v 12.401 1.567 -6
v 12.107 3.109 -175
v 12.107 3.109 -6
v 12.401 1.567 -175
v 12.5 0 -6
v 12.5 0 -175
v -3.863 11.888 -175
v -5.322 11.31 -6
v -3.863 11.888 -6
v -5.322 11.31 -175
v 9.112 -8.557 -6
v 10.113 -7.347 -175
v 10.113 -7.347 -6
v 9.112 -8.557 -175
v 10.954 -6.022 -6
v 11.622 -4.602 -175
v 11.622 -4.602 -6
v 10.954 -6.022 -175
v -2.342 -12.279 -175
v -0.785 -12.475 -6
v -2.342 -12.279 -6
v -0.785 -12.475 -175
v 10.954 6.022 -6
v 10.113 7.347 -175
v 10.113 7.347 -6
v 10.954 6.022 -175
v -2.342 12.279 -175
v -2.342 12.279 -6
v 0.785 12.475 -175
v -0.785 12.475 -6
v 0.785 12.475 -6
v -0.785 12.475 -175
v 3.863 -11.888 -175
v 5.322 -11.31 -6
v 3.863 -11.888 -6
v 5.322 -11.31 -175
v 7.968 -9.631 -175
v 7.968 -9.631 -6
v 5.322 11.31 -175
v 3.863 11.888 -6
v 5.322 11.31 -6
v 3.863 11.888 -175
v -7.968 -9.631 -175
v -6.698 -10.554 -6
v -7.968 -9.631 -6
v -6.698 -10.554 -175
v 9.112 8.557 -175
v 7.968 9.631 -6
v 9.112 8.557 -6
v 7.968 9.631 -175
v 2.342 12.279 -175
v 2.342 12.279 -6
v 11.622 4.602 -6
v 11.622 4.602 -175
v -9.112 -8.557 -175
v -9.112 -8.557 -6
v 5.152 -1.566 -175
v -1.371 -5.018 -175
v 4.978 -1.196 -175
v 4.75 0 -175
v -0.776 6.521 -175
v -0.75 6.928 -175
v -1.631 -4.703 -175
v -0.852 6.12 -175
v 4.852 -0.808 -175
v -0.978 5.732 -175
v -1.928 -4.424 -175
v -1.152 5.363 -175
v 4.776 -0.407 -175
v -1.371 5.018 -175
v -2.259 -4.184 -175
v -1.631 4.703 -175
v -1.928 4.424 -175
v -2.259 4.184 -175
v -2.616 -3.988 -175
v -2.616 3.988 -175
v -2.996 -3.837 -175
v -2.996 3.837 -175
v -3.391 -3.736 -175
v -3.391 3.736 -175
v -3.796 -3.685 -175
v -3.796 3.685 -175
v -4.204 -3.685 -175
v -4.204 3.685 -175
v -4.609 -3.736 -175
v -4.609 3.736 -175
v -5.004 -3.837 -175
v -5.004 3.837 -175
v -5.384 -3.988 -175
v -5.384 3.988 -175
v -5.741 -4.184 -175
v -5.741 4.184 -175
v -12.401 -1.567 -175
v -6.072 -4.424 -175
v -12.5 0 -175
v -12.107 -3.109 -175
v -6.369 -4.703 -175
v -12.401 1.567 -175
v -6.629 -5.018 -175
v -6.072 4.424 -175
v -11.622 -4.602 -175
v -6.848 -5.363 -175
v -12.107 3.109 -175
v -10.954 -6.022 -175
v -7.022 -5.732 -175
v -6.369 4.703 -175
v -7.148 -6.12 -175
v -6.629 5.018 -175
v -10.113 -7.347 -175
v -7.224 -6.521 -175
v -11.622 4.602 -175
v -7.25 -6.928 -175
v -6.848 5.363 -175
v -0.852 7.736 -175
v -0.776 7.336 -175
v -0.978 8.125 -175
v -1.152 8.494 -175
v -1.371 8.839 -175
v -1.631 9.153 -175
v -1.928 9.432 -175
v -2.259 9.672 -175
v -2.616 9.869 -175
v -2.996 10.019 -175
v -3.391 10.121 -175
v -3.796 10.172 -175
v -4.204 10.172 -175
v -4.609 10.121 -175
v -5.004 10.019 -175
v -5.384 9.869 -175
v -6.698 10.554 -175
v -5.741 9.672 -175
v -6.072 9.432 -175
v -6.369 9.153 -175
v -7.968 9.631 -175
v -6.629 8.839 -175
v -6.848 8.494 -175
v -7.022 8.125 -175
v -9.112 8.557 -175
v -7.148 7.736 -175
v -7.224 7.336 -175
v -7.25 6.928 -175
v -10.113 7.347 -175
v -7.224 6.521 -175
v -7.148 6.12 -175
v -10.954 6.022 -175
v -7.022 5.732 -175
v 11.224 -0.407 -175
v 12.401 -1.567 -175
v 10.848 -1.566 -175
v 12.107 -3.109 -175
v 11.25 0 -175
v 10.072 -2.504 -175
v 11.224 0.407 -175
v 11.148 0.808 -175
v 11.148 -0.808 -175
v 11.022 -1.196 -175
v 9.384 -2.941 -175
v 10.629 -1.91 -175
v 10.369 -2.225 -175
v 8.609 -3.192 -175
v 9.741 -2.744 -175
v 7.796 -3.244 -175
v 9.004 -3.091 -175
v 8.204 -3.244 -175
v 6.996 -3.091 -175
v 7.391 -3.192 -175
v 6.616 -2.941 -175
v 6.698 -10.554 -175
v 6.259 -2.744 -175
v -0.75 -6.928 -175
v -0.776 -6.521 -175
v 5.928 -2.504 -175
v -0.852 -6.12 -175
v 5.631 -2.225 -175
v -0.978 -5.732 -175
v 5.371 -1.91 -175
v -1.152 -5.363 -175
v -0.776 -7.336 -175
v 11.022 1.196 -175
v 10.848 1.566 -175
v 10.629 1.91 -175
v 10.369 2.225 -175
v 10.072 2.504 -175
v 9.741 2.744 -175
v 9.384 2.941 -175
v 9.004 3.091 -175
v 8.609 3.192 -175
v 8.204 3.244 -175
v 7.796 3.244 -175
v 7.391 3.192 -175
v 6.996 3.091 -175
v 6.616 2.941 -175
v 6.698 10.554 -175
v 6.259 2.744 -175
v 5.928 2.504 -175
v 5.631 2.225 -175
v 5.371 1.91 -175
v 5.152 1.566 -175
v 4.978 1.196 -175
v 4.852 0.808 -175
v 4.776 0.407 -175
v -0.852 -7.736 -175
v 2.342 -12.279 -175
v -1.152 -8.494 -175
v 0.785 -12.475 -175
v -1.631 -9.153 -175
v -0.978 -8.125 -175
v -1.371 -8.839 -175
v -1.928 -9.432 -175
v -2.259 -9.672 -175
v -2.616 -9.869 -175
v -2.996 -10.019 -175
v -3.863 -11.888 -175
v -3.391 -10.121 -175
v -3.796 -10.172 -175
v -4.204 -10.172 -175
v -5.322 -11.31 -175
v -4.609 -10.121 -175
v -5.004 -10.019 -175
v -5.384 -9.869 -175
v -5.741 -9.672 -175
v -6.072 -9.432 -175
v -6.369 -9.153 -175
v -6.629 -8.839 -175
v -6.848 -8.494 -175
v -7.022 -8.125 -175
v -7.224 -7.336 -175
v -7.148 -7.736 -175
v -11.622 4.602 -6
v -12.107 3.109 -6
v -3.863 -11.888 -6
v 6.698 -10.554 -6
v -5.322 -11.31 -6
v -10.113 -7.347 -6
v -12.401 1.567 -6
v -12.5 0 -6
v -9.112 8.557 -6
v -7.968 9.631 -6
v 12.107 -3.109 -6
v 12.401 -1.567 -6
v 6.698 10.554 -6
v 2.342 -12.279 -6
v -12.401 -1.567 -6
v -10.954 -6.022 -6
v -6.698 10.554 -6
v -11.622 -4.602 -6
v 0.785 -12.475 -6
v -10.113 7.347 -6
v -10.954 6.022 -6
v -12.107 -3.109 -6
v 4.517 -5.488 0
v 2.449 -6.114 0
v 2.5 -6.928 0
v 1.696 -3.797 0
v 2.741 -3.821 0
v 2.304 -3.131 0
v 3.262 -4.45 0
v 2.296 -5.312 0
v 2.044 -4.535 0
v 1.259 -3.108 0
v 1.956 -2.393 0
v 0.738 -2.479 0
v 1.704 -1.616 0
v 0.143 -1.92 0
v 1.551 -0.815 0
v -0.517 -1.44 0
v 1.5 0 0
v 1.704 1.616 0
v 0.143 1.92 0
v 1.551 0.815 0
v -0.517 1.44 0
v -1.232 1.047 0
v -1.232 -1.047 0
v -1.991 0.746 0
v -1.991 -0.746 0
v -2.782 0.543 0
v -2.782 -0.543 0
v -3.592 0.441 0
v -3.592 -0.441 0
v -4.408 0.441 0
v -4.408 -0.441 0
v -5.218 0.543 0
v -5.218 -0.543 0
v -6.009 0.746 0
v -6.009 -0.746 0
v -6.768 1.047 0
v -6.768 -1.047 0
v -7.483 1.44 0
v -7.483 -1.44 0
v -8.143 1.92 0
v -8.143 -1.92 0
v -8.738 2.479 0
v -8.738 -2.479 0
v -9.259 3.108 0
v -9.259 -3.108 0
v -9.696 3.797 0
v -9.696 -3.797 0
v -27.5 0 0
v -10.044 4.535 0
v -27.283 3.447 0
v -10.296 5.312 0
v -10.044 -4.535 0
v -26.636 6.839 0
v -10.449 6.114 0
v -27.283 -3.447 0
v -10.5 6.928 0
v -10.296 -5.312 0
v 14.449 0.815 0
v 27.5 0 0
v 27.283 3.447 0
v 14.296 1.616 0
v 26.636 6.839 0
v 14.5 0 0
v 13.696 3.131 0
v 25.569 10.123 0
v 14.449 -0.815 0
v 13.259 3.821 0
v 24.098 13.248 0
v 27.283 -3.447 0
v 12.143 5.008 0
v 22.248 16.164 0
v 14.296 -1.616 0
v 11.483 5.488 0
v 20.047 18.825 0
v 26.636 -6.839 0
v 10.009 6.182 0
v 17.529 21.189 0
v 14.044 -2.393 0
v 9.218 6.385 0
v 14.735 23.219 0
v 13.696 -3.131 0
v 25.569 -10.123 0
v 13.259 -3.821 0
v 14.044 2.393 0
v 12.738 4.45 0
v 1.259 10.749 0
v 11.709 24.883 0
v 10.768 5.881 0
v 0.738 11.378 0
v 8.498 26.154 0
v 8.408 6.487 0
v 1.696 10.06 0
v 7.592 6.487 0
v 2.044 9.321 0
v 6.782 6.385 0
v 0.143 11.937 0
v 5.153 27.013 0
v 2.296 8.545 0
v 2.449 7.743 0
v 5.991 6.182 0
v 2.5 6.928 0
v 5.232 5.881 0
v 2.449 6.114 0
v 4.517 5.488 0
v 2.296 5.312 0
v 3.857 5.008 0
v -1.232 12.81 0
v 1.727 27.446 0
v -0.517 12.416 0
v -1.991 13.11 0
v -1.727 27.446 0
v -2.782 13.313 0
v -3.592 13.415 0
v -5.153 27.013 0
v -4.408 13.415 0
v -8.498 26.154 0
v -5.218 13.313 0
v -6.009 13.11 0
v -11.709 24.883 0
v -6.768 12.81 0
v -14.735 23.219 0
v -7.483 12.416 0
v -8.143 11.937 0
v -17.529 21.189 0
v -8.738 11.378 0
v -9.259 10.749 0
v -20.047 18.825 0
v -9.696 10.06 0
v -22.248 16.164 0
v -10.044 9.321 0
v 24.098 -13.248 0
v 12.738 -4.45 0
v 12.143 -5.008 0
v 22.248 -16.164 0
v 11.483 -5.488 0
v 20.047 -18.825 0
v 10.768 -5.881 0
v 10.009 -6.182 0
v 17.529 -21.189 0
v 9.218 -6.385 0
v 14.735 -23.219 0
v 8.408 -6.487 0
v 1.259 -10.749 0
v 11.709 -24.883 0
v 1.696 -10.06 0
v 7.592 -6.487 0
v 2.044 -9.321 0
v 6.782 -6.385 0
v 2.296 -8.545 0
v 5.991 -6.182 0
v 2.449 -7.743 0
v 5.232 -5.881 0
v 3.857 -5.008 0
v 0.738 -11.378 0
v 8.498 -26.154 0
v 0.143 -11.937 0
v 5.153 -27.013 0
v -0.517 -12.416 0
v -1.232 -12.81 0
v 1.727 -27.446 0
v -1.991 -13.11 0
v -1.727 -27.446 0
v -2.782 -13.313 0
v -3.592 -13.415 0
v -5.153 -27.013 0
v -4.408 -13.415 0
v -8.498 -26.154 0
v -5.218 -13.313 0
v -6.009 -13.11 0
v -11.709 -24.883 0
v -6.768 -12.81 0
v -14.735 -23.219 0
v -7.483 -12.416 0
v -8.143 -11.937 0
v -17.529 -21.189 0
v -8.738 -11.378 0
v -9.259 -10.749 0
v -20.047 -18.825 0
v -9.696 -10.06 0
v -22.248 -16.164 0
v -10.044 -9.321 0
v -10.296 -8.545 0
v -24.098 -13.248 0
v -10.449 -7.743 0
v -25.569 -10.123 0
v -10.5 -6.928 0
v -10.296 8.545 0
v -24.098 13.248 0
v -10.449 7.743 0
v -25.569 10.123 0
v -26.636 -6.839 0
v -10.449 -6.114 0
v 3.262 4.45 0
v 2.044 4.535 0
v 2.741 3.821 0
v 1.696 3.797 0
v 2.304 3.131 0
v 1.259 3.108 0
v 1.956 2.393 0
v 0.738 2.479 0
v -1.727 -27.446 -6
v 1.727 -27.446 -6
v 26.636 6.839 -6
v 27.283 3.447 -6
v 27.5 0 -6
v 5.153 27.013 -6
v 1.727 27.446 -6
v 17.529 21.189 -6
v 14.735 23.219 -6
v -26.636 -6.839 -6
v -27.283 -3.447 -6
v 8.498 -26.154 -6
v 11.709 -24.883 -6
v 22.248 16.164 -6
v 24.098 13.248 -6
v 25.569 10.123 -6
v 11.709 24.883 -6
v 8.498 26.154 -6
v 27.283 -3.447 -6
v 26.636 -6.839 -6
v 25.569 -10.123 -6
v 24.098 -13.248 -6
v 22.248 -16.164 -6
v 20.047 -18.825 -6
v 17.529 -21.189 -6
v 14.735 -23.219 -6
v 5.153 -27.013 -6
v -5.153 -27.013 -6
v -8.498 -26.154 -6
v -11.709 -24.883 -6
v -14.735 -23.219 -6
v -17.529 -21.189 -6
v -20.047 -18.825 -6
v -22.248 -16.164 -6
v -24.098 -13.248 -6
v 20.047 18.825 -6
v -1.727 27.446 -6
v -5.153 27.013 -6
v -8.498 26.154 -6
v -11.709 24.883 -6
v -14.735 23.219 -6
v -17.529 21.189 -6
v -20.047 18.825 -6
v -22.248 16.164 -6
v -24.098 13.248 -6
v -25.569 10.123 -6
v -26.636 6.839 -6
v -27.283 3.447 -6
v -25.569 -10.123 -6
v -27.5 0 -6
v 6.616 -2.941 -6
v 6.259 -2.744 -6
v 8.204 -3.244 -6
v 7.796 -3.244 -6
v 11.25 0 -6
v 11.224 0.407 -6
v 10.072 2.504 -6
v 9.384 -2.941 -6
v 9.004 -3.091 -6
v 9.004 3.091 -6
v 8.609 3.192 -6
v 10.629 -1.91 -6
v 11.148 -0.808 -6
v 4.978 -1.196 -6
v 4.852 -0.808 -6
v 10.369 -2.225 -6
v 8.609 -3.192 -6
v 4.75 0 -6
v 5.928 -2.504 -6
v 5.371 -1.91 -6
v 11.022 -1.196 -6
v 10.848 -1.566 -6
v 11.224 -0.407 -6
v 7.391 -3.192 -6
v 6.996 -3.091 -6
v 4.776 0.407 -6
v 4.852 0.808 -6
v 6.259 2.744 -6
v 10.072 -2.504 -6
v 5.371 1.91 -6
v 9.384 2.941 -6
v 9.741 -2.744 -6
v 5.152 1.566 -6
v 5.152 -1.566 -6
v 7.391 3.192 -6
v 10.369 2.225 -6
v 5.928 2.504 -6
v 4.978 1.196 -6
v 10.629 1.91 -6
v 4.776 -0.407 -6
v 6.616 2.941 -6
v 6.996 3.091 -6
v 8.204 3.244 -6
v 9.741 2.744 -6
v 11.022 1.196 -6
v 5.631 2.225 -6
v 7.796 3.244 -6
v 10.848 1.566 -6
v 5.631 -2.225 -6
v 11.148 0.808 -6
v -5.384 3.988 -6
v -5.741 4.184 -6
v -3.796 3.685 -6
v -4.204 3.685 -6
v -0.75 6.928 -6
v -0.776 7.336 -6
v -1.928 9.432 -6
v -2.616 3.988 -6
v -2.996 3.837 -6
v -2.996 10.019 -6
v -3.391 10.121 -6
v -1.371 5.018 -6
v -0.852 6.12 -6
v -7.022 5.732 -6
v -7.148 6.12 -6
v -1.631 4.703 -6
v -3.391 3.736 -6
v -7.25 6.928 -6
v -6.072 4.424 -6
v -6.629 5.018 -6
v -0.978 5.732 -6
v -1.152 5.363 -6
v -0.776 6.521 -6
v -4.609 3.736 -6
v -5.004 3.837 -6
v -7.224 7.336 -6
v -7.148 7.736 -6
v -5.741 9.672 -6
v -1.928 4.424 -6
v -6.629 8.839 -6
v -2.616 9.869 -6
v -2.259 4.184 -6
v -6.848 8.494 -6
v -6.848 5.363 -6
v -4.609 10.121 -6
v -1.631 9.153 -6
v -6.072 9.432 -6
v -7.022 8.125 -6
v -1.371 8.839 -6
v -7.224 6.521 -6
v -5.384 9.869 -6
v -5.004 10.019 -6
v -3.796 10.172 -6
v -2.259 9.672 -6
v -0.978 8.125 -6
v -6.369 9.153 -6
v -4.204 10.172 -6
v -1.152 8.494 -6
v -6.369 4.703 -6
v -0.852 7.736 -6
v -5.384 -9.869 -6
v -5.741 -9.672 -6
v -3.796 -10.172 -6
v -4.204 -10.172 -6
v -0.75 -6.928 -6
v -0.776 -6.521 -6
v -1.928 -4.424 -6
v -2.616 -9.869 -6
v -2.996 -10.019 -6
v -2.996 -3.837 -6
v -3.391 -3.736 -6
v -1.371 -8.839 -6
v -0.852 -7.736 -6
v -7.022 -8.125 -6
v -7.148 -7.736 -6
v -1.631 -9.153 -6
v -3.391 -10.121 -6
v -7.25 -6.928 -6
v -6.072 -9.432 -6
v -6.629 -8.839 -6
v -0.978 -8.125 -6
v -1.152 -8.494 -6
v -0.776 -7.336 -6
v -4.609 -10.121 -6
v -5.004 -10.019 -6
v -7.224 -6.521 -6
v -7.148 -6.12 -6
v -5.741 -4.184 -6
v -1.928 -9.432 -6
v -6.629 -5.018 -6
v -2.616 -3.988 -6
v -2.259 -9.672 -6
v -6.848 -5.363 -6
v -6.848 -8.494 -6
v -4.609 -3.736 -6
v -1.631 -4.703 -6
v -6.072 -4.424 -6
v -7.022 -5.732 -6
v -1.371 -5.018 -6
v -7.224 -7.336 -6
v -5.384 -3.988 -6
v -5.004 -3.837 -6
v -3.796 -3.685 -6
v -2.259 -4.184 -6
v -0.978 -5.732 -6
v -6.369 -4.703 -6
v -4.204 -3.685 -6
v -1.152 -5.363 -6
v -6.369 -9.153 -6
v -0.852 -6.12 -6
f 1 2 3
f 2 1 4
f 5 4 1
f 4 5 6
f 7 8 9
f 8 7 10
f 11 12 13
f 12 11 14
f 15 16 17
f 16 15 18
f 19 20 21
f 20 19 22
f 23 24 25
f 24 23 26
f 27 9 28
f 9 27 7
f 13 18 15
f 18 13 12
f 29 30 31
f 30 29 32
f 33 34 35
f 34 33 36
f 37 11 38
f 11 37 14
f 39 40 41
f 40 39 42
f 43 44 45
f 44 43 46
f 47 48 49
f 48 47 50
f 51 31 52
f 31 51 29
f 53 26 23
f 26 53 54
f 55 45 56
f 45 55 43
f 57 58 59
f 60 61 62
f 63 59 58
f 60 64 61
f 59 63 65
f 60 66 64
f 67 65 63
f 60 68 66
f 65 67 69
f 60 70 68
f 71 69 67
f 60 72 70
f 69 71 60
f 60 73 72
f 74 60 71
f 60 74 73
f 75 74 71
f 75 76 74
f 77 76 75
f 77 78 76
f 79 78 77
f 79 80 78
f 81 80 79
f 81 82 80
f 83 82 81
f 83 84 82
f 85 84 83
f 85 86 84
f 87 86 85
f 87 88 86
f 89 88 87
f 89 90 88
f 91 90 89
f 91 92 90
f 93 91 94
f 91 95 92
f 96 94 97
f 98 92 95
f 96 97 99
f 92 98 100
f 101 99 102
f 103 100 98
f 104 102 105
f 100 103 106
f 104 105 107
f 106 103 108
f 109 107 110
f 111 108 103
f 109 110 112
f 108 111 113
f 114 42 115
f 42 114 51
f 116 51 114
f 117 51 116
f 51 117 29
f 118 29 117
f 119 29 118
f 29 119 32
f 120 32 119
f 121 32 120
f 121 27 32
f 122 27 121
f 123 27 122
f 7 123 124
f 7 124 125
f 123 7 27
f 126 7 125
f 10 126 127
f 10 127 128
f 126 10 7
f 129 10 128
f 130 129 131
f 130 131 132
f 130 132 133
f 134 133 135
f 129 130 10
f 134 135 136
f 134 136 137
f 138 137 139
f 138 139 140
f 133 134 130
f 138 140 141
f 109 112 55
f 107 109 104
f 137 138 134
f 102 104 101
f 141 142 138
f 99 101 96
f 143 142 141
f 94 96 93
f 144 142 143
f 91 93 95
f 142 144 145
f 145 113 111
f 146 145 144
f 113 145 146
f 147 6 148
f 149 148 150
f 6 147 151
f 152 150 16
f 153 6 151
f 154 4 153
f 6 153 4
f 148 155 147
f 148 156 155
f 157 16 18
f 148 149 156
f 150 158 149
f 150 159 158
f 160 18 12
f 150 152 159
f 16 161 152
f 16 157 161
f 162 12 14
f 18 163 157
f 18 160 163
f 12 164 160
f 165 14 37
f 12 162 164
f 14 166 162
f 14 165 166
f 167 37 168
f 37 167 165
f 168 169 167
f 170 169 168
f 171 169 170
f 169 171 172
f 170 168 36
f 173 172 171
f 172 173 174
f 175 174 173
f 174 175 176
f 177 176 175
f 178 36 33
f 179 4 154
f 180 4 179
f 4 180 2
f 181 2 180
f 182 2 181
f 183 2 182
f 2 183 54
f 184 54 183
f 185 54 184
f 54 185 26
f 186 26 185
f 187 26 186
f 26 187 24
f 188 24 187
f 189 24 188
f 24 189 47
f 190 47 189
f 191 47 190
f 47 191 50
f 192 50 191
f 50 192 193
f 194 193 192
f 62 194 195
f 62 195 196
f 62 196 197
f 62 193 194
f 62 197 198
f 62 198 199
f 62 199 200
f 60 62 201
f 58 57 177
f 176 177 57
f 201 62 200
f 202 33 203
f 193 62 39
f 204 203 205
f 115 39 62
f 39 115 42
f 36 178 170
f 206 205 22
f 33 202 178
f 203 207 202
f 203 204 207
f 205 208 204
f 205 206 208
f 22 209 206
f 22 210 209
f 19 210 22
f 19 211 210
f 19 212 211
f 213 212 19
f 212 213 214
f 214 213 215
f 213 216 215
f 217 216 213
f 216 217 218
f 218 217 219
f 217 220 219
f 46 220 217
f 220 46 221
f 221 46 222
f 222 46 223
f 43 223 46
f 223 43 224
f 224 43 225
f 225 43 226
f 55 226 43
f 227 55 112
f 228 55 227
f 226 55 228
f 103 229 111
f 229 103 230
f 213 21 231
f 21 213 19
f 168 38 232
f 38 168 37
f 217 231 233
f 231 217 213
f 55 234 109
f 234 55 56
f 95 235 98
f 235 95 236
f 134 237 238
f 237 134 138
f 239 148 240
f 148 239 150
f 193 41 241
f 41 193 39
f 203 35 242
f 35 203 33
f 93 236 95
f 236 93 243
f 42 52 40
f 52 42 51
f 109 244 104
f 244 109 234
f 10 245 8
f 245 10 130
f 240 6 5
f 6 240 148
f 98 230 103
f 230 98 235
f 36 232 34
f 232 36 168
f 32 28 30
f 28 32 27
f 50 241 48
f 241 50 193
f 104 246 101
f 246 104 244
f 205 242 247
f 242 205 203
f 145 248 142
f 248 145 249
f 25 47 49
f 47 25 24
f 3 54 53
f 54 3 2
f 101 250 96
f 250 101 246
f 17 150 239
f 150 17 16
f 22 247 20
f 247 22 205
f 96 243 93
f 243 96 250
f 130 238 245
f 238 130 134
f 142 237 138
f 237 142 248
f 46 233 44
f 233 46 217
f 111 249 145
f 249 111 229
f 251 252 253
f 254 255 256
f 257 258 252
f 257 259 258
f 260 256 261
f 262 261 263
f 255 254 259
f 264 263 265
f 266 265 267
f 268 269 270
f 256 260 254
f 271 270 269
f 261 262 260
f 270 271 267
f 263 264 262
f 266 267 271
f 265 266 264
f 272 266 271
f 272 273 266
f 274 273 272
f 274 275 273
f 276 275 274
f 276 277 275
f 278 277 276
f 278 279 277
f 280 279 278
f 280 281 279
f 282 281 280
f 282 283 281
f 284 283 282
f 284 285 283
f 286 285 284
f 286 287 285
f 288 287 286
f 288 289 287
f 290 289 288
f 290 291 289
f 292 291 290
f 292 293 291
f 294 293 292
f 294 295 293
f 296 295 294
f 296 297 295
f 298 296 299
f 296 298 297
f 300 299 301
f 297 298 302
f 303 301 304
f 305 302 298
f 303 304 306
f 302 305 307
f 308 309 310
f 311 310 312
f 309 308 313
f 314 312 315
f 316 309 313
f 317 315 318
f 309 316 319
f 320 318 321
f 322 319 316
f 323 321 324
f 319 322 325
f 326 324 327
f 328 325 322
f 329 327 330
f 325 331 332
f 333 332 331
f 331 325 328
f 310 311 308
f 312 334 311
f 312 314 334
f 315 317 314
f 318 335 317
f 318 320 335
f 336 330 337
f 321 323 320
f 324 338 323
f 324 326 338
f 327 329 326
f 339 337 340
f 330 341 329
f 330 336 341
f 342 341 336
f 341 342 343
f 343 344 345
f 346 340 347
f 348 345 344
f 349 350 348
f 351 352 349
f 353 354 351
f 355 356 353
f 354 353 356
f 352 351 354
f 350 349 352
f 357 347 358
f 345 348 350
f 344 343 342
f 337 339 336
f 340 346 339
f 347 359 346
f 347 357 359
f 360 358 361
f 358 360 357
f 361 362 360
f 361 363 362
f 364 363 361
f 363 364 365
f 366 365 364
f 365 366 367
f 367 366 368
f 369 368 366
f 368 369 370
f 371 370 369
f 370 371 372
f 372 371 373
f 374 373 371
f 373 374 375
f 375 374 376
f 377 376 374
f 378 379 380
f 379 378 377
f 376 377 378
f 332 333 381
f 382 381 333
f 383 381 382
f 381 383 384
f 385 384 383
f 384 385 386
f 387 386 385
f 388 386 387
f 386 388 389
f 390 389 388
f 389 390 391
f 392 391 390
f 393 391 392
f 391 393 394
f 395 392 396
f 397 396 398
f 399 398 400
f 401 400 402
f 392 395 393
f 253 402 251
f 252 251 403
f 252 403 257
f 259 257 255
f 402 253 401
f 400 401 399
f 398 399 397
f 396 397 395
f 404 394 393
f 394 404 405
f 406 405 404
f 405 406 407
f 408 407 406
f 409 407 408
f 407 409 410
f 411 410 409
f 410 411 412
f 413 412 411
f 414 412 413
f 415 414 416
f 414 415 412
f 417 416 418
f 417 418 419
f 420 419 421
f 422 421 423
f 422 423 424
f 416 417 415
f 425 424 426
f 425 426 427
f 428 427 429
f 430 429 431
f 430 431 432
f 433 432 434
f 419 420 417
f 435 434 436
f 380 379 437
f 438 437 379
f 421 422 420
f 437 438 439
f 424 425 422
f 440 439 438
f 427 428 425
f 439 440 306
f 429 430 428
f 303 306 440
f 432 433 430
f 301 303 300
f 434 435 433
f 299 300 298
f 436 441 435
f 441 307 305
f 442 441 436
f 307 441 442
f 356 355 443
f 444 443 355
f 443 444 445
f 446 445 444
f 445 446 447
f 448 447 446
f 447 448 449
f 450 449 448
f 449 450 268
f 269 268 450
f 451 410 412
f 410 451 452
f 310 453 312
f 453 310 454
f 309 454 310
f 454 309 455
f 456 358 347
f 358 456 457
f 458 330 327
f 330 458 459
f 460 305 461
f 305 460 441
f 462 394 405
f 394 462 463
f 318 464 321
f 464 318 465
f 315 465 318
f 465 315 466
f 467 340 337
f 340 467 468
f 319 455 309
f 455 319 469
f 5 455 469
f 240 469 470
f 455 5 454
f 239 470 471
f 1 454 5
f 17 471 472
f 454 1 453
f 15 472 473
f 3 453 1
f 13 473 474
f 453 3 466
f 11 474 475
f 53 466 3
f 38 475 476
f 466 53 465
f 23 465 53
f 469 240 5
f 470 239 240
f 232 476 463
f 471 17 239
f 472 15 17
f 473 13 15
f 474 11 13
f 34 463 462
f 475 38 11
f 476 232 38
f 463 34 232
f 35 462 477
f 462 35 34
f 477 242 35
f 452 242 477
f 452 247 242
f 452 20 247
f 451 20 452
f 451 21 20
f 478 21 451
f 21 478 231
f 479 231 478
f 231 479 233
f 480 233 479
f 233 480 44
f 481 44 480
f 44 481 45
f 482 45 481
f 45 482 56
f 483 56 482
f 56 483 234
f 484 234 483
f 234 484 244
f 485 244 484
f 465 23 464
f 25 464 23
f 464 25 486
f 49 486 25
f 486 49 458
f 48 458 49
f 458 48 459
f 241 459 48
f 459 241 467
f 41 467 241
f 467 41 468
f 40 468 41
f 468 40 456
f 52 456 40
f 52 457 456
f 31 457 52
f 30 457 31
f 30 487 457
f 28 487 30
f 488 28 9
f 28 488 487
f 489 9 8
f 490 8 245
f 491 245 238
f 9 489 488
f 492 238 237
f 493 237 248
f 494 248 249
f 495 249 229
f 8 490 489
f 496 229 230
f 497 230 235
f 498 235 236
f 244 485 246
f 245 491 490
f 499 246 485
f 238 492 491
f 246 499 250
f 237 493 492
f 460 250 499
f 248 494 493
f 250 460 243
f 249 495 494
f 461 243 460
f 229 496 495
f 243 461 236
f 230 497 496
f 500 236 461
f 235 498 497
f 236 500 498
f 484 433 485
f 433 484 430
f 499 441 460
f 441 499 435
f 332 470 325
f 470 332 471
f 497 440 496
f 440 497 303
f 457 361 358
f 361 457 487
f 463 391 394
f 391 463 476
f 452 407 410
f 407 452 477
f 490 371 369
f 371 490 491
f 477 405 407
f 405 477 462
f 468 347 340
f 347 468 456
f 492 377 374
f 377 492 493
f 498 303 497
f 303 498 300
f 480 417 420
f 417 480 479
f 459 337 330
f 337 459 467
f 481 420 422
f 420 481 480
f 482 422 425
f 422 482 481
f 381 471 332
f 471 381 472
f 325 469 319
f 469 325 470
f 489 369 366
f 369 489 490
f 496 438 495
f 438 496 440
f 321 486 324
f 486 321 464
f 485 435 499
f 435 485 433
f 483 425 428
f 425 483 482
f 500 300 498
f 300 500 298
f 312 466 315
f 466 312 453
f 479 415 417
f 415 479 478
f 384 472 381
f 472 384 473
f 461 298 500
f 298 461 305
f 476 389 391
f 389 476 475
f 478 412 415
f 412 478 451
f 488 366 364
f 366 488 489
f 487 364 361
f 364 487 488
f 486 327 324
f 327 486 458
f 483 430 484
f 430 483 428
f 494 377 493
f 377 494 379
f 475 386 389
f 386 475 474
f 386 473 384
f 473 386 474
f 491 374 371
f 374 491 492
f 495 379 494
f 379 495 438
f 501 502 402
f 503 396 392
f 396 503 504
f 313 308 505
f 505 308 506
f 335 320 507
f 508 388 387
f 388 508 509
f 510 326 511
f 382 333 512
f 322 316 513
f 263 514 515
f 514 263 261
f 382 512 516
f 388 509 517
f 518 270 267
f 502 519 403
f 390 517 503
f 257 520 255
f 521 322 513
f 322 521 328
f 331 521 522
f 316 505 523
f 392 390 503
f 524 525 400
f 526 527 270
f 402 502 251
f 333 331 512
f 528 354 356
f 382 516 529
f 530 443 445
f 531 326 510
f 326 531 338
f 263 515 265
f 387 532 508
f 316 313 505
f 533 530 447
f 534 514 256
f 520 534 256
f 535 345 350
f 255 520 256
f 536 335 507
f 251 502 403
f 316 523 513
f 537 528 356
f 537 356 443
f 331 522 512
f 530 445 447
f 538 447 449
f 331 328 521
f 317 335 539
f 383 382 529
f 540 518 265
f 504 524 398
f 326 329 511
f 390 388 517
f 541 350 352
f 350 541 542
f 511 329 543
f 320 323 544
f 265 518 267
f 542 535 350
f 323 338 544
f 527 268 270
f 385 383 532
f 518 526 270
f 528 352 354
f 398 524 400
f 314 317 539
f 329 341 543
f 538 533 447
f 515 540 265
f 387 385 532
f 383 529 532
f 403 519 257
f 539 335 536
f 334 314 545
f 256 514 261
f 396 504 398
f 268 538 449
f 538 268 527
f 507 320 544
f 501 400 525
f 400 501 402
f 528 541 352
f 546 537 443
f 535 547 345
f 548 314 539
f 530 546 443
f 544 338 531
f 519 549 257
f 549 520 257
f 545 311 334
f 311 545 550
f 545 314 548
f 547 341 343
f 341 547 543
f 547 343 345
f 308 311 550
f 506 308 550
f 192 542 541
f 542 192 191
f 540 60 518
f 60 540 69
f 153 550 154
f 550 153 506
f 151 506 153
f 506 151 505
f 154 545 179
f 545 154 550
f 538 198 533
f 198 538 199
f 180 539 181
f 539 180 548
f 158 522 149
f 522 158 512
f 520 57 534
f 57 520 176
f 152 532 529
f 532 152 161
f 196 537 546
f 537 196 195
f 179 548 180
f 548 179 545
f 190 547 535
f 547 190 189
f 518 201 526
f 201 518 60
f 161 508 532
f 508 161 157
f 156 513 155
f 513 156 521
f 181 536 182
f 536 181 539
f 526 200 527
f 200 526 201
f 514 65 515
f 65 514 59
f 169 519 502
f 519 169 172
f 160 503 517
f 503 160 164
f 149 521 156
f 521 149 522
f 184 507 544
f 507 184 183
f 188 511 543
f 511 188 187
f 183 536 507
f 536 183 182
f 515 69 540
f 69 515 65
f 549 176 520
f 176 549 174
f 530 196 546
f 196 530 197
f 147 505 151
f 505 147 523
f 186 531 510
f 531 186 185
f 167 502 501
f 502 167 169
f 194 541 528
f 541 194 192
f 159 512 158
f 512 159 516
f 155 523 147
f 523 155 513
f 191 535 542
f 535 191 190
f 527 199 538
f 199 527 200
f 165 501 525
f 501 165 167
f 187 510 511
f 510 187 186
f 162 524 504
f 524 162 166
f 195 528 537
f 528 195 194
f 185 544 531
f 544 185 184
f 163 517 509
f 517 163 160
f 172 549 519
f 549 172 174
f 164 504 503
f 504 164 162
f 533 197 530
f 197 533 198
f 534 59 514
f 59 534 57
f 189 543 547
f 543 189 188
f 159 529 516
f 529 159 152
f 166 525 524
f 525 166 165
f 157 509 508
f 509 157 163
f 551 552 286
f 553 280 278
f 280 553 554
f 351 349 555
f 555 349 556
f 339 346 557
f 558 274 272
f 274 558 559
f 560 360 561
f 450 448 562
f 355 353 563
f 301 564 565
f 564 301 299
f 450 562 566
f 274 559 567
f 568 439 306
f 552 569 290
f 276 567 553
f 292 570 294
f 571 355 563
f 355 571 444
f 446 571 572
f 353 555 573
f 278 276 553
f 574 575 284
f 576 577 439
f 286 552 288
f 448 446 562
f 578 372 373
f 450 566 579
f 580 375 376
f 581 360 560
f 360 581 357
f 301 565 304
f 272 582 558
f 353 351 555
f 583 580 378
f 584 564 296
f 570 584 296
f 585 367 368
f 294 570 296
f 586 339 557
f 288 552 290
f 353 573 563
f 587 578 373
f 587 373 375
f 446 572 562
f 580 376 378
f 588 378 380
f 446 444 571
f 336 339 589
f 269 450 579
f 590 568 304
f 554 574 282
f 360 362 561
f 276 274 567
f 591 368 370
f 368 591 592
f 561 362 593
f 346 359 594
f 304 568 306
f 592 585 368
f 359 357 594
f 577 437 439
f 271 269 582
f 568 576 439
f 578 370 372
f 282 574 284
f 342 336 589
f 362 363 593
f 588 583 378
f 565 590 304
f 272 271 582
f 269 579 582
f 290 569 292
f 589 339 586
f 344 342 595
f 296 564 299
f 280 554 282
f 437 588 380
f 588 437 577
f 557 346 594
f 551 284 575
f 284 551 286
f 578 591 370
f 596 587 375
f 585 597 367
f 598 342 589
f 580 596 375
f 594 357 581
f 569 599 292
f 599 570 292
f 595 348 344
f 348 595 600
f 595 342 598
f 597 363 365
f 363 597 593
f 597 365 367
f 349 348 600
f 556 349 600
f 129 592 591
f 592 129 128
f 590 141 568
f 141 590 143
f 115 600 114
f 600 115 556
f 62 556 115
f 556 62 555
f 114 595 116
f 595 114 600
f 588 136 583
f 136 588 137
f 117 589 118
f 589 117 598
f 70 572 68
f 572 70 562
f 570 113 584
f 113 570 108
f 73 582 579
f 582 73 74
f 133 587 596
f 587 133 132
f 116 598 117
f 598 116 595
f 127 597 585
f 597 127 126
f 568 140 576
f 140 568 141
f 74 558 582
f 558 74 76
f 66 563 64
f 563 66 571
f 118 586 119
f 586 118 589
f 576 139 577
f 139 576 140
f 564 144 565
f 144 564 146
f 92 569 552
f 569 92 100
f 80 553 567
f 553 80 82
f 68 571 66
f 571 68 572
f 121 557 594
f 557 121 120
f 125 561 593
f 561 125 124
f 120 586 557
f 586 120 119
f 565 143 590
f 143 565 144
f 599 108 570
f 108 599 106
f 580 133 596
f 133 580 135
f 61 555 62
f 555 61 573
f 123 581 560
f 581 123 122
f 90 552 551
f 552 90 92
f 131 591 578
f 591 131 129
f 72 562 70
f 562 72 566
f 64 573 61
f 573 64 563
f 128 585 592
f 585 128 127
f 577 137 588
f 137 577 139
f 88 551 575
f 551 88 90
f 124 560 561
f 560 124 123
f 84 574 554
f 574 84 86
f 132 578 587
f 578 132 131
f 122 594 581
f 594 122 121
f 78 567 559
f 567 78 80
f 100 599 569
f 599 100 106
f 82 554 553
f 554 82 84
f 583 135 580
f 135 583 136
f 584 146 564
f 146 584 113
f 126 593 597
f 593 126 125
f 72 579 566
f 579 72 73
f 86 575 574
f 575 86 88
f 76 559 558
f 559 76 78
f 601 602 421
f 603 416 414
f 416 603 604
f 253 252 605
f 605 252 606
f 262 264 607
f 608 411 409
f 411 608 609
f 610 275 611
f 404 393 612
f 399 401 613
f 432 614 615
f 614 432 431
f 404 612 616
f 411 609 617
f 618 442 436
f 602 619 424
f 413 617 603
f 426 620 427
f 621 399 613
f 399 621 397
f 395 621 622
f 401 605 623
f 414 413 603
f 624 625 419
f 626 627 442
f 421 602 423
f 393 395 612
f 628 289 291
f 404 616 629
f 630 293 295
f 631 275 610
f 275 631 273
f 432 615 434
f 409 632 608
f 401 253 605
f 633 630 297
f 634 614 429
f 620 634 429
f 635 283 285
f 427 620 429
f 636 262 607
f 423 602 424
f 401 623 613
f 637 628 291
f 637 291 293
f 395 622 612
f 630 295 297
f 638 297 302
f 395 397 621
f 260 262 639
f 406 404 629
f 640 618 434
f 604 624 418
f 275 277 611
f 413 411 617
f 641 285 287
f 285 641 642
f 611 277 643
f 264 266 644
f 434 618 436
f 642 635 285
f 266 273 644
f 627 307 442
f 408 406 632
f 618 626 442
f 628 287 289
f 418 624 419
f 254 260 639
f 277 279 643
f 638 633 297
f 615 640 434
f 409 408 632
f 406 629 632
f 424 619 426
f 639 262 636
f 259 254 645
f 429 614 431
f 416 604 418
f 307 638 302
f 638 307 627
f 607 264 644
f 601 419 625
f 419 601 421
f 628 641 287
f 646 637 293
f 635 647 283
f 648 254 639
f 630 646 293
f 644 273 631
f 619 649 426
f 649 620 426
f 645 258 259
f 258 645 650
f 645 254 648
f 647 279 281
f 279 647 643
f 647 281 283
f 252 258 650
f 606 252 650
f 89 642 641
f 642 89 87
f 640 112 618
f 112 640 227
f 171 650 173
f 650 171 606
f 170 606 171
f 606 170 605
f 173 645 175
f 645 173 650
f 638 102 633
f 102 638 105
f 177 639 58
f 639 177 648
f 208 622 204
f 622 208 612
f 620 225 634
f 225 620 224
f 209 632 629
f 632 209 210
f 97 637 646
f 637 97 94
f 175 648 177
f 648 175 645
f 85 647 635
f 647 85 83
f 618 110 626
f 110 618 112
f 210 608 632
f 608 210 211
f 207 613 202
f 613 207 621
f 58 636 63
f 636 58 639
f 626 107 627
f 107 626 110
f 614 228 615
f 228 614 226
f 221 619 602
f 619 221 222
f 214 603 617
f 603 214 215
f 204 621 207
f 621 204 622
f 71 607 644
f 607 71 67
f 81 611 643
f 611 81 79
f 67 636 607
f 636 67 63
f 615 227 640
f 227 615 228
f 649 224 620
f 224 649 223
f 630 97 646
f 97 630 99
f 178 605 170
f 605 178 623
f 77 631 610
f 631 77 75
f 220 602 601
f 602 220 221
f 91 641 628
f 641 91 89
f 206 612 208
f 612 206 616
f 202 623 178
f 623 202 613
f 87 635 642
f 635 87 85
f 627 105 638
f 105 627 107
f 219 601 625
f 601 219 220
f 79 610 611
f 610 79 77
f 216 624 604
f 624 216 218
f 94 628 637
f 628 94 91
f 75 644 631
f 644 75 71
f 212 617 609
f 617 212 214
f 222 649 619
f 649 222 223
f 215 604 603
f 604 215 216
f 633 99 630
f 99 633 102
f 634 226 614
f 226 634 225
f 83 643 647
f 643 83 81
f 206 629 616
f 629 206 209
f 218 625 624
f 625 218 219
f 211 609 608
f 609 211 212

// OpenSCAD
$fn = 50;


difference() {
	union() {
		translate(v = [0, 0, -175.0000000000]) {
			cylinder(h = 175, r = 12.5000000000);
		}
		translate(v = [0, 0, -6.0000000000]) {
			cylinder(h = 6, r = 27.5000000000);
		}
	}
	union() {
		translate(v = [8.0000000000, 0.0000000000, 0]) {
			rotate(a = [0, 0, 0]) {
				difference() {
					union() {
						#translate(v = [0, 0, -175.0000000000]) {
							cylinder(h = 175, r = 2.2500000000);
						}
						#translate(v = [0, 0, -6]) {
							cylinder(h = 6, r = 12.5000000000, r1 = 3.2500000000, r2 = 6.5000000000);
						}
						#translate(v = [0, 0, -175.0000000000]) {
							cylinder(h = 175, r = 3.2500000000);
						}
						#translate(v = [0, 0, -175.0000000000]) {
							cylinder(h = 175, r = 2.2500000000);
						}
					}
					union();
				}
			}
		}
		translate(v = [-4.0000000000, 6.9282032303, 0]) {
			rotate(a = [0, 0, 0]) {
				difference() {
					union() {
						#translate(v = [0, 0, -175.0000000000]) {
							cylinder(h = 175, r = 2.2500000000);
						}
						#translate(v = [0, 0, -6]) {
							cylinder(h = 6, r = 12.5000000000, r1 = 3.2500000000, r2 = 6.5000000000);
						}
						#translate(v = [0, 0, -175.0000000000]) {
							cylinder(h = 175, r = 3.2500000000);
						}
						#translate(v = [0, 0, -175.0000000000]) {
							cylinder(h = 175, r = 2.2500000000);
						}
					}
					union();
				}
			}
		}
		translate(v = [-4.0000000000, -6.9282032303, 0]) {
			rotate(a = [0, 0, 0]) {
				difference() {
					union() {
						#translate(v = [0, 0, -175.0000000000]) {
							cylinder(h = 175, r = 2.2500000000);
						}
						#translate(v = [0, 0, -6]) {
							cylinder(h = 6, r = 12.5000000000, r1 = 3.2500000000, r2 = 6.5000000000);
						}
						#translate(v = [0, 0, -175.0000000000]) {
							cylinder(h = 175, r = 3.2500000000);
						}
						#translate(v = [0, 0, -175.0000000000]) {
							cylinder(h = 175, r = 2.2500000000);
						}
					}
					union();
				}
			}
		}
	}
}
